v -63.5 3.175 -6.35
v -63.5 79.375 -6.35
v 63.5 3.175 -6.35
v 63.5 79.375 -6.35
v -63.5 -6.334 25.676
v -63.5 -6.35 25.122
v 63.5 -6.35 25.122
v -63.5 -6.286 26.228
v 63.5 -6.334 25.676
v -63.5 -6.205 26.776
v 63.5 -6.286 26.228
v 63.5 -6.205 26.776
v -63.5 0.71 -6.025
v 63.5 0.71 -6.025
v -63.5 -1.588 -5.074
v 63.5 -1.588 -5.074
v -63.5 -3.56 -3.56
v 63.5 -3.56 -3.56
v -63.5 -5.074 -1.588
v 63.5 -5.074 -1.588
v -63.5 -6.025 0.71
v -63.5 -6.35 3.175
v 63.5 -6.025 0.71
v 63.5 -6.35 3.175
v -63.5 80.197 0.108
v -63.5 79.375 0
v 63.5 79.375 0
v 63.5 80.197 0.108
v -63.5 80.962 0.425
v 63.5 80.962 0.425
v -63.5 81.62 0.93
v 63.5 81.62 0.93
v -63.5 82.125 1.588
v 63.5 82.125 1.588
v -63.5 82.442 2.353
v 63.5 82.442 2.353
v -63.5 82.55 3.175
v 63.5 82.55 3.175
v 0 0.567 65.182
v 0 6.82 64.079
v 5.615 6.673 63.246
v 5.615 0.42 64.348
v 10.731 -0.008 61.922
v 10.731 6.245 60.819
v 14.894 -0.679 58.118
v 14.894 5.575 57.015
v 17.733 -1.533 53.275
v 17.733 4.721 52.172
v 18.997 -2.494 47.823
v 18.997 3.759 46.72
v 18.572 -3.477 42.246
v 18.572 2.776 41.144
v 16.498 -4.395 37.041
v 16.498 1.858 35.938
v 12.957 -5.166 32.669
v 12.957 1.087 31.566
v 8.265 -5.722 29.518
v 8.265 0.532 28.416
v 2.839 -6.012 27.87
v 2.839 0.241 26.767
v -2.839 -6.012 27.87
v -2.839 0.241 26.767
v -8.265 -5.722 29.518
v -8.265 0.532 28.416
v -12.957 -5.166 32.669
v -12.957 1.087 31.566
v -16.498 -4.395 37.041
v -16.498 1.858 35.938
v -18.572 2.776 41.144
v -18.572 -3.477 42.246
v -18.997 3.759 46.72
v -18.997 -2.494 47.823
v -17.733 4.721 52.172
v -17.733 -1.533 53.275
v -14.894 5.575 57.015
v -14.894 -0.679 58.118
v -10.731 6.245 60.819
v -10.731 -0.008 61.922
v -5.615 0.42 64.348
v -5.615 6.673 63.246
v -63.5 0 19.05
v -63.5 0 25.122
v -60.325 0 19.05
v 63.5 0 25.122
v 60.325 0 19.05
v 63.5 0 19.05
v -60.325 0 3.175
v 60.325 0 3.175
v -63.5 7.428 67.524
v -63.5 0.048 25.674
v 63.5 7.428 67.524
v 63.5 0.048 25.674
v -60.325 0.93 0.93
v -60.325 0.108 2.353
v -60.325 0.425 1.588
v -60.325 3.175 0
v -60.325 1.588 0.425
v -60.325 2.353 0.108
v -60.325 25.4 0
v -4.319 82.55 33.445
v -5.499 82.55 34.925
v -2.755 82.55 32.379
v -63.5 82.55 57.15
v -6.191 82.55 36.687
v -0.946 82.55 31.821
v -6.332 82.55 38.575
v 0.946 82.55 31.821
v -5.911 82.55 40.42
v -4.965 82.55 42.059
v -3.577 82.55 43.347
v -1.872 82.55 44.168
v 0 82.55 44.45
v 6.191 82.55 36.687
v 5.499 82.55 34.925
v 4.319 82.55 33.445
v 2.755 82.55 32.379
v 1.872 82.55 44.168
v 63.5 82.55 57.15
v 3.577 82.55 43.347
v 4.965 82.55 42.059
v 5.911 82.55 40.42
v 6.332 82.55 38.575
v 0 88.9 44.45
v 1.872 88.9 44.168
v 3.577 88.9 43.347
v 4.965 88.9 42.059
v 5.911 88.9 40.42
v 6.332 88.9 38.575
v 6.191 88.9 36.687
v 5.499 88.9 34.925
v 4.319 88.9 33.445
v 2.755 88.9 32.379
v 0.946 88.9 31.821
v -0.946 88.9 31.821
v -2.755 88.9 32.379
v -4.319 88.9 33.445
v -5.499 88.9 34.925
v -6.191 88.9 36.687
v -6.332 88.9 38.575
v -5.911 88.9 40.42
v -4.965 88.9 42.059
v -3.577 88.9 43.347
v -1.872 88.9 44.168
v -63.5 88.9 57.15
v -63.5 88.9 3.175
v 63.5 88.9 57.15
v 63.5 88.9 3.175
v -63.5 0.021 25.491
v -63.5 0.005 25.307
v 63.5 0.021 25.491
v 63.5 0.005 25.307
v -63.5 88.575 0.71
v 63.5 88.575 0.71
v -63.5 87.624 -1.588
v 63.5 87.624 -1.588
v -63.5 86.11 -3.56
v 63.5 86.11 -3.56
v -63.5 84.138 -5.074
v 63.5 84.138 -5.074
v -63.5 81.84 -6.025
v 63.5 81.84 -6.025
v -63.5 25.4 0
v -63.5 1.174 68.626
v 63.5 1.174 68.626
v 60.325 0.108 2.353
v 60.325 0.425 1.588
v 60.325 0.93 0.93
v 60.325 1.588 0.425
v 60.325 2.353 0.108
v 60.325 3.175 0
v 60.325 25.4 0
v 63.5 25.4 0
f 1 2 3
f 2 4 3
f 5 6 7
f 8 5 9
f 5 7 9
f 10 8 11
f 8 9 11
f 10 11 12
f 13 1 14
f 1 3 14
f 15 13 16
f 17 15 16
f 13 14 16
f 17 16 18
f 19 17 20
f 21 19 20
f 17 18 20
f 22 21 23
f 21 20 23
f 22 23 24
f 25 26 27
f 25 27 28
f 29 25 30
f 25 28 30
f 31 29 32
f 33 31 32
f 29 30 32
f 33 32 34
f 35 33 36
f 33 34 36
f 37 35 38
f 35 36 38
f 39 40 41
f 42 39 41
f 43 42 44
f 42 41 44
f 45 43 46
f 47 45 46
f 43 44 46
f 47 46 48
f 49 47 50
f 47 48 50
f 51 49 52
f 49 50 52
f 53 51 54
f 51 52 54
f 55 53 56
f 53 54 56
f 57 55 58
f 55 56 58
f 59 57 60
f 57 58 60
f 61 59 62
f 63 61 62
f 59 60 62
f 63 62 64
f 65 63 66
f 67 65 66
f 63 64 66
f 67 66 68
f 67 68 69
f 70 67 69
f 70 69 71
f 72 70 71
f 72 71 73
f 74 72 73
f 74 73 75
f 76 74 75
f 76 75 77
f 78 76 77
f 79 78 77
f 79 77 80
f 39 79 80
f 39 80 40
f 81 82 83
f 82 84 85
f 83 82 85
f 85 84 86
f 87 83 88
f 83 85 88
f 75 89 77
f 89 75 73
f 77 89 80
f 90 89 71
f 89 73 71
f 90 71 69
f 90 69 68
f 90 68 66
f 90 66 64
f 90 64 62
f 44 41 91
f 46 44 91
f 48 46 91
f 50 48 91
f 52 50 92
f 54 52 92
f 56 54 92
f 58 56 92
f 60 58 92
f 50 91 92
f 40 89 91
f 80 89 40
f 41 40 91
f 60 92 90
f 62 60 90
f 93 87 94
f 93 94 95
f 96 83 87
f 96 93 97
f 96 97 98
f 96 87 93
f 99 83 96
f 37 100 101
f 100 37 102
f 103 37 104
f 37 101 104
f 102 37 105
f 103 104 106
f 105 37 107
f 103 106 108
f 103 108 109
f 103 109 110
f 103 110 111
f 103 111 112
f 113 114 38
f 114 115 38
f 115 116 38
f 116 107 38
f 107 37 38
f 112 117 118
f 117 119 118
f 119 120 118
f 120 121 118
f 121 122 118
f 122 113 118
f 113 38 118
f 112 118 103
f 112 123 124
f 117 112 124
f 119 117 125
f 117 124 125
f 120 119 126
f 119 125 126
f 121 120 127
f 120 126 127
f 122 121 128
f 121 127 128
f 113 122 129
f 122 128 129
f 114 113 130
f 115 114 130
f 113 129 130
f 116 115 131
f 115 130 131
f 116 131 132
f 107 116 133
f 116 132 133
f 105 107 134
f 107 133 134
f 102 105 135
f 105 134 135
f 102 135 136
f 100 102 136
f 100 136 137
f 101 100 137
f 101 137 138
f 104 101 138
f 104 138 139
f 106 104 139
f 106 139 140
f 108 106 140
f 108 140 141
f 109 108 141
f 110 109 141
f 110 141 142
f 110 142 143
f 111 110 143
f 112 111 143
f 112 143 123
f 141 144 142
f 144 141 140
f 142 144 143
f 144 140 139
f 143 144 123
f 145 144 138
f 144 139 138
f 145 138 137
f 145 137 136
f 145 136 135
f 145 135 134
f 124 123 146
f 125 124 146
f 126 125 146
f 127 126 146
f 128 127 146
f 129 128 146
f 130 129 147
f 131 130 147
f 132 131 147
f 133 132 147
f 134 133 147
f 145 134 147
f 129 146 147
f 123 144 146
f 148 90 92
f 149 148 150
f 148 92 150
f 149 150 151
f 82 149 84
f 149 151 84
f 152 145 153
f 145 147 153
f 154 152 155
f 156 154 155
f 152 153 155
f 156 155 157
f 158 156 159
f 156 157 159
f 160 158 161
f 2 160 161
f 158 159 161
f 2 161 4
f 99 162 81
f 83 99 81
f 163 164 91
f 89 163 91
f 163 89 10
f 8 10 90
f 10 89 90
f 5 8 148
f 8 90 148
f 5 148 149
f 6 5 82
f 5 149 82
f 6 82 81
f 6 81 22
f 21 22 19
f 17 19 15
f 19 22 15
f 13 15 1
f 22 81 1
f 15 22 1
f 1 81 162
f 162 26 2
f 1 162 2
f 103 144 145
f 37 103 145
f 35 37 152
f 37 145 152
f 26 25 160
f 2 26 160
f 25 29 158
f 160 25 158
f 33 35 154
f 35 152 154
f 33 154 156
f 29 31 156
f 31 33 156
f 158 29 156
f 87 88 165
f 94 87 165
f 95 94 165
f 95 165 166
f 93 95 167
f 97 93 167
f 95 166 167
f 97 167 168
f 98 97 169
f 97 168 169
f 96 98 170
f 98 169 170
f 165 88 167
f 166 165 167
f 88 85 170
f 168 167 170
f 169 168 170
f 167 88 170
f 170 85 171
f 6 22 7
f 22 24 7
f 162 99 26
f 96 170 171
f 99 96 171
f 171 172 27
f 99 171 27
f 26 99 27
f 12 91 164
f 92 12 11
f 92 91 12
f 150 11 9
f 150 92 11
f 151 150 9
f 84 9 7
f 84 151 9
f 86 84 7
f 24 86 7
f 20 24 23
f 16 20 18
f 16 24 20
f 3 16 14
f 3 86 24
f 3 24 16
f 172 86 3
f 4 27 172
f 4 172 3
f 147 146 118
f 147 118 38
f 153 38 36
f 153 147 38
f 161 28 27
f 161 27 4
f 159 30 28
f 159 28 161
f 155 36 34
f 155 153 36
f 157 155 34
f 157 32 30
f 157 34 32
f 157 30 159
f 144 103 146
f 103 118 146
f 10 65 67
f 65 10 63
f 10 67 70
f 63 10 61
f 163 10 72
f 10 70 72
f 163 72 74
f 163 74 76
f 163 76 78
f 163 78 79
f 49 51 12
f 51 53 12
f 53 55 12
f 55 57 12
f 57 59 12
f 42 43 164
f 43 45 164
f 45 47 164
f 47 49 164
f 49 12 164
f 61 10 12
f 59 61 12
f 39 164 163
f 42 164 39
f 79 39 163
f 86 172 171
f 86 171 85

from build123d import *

# Parameters (mm, degrees)
BASE_EXTRUDE_THIN_DEPTH = 63.5
CUT_EXTRUDE1_REACH      = 135.471
SKETCH2_R               = 6.35
BOSS_EXTRUDE1_DEPTH     = 3.175
D_GAGEMENT_00001_D      = 25.4
D_GAGEMENT_00001_DEPTH  = 6.35
D_GAGEMENT_00001_TIP    = 7.630929862
ESQUISSE3_R             = 19.05
ENL_V_MAT_EXTRU_1_DEPTH = 132.649844576


with BuildPart() as part:
    # Sketch1 → Base-Extrude-Thin (new, symmetric)
    with BuildSketch(Plane(origin=(0, 0, 0), x_dir=(0, 0, -1), z_dir=(1, 0, 0))):
        with BuildLine():
            Line((-67.523772904, 7.427557692), (-25.673556457, 0.048235384))
            ThreePointArc((-25.673556457, 0.048235384), (-25.398942977, 0.012081834), (-25.122223493, 0))
            Line((-25.122223493, 0), (-3.175, 0))
            ThreePointArc((-3.175, 0), (-0.92993597, 0.92993597), (0, 3.175))
            Line((0, 3.175), (0, 79.375))
            ThreePointArc((0, 79.375), (-0.92993597, 81.62006403), (-3.175, 82.55))
            Line((-3.175, 82.55), (-57.15, 82.55))
            Line((-57.15, 82.55), (-57.15, 88.9))
            Line((-57.15, 88.9), (-3.175, 88.9))
            ThreePointArc((-3.175, 88.9), (3.560192091, 86.110192091), (6.35, 79.375))
            Line((6.35, 79.375), (6.35, 3.175))
            ThreePointArc((6.35, 3.175), (3.560192091, -3.560192091), (-3.175, -6.35))
            Line((-3.175, -6.35), (-25.122223493, -6.35))
            ThreePointArc((-25.122223493, -6.35), (-25.952381943, -6.313754499), (-26.776222386, -6.205293847))
            Line((-26.776222386, -6.205293847), (-68.626438832, 1.174028461))
            Line((-68.626438832, 1.174028461), (-67.523772904, 7.427557692))
        make_face()
    extrude(amount=BASE_EXTRUDE_THIN_DEPTH, both=True)

    # Sketch2 → Cut-Extrude1 (cut, up to next)
    with BuildSketch(Plane(origin=(0, 88.9, 0), x_dir=(-1, 0, 0), z_dir=(0, 1, 0)), mode=Mode.PRIVATE) as cut_extrude1_sk1:
        with Locations(Location((0, 38.1, 0), (0, 0, 90))):
            Circle(SKETCH2_R)
    cut_extrude1_tool1 = extrude(cut_extrude1_sk1.sketch, amount=-CUT_EXTRUDE1_REACH, mode=Mode.PRIVATE) & part.part
    add(cut_extrude1_tool1.solids().sort_by_distance((0, 88.9, 38.1))[0], mode=Mode.SUBTRACT)

    # Sketch3 → Boss-Extrude1 (add)
    with BuildSketch(Plane(origin=(63.5, 0, 0), x_dir=(0, 0, -1), z_dir=(1, 0, 0))):
        with BuildLine():
            Line((-19.05, 0), (-3.175, 0))
            ThreePointArc((-3.175, 0), (-0.92993597, 0.92993597), (0, 3.175))
            Line((0, 3.175), (0, 25.4))
            Line((0, 25.4), (-19.05, 0))
        make_face()
    boss_extrude1 = extrude(amount=-BOSS_EXTRUDE1_DEPTH)

    # Mirror1: Boss-Extrude1 across plane
    add(boss_extrude1.mirror(Plane(origin=(0, 0, 0), x_dir=(0, 0, 1), z_dir=(1, 0, 0))))

    # Dégagement #00001
    with Locations(Plane(origin=(0, -4.34365582, 0.765903716), x_dir=(-1, 0, 0), z_dir=(0, 0.9848077530122081, -0.17364817766693075))):
        with Locations((-4.206462063, 49.405030417)):
            Hole(D_GAGEMENT_00001_D / 2, depth=D_GAGEMENT_00001_DEPTH)
            with Locations((0, 0, -(D_GAGEMENT_00001_DEPTH + D_GAGEMENT_00001_TIP / 2))):  # 118° drill point
                Cone(0, D_GAGEMENT_00001_D / 2, D_GAGEMENT_00001_TIP, mode=Mode.SUBTRACT)

    # Esquisse3 → Enlèv. mat.-Extru.1 (cut, through all)
    with BuildSketch(Plane(origin=(0, -4.34365582, 0.765903716), x_dir=(1, 0, 0), z_dir=(0, 0.9848077530122081, -0.1736481776669307))):
        with Locations(Location((0, -45.239836887, 0), (0, 0, 270))):
            Circle(ESQUISSE3_R)
    extrude(amount=-ENL_V_MAT_EXTRU_1_DEPTH, mode=Mode.SUBTRACT)


solid = part.part
